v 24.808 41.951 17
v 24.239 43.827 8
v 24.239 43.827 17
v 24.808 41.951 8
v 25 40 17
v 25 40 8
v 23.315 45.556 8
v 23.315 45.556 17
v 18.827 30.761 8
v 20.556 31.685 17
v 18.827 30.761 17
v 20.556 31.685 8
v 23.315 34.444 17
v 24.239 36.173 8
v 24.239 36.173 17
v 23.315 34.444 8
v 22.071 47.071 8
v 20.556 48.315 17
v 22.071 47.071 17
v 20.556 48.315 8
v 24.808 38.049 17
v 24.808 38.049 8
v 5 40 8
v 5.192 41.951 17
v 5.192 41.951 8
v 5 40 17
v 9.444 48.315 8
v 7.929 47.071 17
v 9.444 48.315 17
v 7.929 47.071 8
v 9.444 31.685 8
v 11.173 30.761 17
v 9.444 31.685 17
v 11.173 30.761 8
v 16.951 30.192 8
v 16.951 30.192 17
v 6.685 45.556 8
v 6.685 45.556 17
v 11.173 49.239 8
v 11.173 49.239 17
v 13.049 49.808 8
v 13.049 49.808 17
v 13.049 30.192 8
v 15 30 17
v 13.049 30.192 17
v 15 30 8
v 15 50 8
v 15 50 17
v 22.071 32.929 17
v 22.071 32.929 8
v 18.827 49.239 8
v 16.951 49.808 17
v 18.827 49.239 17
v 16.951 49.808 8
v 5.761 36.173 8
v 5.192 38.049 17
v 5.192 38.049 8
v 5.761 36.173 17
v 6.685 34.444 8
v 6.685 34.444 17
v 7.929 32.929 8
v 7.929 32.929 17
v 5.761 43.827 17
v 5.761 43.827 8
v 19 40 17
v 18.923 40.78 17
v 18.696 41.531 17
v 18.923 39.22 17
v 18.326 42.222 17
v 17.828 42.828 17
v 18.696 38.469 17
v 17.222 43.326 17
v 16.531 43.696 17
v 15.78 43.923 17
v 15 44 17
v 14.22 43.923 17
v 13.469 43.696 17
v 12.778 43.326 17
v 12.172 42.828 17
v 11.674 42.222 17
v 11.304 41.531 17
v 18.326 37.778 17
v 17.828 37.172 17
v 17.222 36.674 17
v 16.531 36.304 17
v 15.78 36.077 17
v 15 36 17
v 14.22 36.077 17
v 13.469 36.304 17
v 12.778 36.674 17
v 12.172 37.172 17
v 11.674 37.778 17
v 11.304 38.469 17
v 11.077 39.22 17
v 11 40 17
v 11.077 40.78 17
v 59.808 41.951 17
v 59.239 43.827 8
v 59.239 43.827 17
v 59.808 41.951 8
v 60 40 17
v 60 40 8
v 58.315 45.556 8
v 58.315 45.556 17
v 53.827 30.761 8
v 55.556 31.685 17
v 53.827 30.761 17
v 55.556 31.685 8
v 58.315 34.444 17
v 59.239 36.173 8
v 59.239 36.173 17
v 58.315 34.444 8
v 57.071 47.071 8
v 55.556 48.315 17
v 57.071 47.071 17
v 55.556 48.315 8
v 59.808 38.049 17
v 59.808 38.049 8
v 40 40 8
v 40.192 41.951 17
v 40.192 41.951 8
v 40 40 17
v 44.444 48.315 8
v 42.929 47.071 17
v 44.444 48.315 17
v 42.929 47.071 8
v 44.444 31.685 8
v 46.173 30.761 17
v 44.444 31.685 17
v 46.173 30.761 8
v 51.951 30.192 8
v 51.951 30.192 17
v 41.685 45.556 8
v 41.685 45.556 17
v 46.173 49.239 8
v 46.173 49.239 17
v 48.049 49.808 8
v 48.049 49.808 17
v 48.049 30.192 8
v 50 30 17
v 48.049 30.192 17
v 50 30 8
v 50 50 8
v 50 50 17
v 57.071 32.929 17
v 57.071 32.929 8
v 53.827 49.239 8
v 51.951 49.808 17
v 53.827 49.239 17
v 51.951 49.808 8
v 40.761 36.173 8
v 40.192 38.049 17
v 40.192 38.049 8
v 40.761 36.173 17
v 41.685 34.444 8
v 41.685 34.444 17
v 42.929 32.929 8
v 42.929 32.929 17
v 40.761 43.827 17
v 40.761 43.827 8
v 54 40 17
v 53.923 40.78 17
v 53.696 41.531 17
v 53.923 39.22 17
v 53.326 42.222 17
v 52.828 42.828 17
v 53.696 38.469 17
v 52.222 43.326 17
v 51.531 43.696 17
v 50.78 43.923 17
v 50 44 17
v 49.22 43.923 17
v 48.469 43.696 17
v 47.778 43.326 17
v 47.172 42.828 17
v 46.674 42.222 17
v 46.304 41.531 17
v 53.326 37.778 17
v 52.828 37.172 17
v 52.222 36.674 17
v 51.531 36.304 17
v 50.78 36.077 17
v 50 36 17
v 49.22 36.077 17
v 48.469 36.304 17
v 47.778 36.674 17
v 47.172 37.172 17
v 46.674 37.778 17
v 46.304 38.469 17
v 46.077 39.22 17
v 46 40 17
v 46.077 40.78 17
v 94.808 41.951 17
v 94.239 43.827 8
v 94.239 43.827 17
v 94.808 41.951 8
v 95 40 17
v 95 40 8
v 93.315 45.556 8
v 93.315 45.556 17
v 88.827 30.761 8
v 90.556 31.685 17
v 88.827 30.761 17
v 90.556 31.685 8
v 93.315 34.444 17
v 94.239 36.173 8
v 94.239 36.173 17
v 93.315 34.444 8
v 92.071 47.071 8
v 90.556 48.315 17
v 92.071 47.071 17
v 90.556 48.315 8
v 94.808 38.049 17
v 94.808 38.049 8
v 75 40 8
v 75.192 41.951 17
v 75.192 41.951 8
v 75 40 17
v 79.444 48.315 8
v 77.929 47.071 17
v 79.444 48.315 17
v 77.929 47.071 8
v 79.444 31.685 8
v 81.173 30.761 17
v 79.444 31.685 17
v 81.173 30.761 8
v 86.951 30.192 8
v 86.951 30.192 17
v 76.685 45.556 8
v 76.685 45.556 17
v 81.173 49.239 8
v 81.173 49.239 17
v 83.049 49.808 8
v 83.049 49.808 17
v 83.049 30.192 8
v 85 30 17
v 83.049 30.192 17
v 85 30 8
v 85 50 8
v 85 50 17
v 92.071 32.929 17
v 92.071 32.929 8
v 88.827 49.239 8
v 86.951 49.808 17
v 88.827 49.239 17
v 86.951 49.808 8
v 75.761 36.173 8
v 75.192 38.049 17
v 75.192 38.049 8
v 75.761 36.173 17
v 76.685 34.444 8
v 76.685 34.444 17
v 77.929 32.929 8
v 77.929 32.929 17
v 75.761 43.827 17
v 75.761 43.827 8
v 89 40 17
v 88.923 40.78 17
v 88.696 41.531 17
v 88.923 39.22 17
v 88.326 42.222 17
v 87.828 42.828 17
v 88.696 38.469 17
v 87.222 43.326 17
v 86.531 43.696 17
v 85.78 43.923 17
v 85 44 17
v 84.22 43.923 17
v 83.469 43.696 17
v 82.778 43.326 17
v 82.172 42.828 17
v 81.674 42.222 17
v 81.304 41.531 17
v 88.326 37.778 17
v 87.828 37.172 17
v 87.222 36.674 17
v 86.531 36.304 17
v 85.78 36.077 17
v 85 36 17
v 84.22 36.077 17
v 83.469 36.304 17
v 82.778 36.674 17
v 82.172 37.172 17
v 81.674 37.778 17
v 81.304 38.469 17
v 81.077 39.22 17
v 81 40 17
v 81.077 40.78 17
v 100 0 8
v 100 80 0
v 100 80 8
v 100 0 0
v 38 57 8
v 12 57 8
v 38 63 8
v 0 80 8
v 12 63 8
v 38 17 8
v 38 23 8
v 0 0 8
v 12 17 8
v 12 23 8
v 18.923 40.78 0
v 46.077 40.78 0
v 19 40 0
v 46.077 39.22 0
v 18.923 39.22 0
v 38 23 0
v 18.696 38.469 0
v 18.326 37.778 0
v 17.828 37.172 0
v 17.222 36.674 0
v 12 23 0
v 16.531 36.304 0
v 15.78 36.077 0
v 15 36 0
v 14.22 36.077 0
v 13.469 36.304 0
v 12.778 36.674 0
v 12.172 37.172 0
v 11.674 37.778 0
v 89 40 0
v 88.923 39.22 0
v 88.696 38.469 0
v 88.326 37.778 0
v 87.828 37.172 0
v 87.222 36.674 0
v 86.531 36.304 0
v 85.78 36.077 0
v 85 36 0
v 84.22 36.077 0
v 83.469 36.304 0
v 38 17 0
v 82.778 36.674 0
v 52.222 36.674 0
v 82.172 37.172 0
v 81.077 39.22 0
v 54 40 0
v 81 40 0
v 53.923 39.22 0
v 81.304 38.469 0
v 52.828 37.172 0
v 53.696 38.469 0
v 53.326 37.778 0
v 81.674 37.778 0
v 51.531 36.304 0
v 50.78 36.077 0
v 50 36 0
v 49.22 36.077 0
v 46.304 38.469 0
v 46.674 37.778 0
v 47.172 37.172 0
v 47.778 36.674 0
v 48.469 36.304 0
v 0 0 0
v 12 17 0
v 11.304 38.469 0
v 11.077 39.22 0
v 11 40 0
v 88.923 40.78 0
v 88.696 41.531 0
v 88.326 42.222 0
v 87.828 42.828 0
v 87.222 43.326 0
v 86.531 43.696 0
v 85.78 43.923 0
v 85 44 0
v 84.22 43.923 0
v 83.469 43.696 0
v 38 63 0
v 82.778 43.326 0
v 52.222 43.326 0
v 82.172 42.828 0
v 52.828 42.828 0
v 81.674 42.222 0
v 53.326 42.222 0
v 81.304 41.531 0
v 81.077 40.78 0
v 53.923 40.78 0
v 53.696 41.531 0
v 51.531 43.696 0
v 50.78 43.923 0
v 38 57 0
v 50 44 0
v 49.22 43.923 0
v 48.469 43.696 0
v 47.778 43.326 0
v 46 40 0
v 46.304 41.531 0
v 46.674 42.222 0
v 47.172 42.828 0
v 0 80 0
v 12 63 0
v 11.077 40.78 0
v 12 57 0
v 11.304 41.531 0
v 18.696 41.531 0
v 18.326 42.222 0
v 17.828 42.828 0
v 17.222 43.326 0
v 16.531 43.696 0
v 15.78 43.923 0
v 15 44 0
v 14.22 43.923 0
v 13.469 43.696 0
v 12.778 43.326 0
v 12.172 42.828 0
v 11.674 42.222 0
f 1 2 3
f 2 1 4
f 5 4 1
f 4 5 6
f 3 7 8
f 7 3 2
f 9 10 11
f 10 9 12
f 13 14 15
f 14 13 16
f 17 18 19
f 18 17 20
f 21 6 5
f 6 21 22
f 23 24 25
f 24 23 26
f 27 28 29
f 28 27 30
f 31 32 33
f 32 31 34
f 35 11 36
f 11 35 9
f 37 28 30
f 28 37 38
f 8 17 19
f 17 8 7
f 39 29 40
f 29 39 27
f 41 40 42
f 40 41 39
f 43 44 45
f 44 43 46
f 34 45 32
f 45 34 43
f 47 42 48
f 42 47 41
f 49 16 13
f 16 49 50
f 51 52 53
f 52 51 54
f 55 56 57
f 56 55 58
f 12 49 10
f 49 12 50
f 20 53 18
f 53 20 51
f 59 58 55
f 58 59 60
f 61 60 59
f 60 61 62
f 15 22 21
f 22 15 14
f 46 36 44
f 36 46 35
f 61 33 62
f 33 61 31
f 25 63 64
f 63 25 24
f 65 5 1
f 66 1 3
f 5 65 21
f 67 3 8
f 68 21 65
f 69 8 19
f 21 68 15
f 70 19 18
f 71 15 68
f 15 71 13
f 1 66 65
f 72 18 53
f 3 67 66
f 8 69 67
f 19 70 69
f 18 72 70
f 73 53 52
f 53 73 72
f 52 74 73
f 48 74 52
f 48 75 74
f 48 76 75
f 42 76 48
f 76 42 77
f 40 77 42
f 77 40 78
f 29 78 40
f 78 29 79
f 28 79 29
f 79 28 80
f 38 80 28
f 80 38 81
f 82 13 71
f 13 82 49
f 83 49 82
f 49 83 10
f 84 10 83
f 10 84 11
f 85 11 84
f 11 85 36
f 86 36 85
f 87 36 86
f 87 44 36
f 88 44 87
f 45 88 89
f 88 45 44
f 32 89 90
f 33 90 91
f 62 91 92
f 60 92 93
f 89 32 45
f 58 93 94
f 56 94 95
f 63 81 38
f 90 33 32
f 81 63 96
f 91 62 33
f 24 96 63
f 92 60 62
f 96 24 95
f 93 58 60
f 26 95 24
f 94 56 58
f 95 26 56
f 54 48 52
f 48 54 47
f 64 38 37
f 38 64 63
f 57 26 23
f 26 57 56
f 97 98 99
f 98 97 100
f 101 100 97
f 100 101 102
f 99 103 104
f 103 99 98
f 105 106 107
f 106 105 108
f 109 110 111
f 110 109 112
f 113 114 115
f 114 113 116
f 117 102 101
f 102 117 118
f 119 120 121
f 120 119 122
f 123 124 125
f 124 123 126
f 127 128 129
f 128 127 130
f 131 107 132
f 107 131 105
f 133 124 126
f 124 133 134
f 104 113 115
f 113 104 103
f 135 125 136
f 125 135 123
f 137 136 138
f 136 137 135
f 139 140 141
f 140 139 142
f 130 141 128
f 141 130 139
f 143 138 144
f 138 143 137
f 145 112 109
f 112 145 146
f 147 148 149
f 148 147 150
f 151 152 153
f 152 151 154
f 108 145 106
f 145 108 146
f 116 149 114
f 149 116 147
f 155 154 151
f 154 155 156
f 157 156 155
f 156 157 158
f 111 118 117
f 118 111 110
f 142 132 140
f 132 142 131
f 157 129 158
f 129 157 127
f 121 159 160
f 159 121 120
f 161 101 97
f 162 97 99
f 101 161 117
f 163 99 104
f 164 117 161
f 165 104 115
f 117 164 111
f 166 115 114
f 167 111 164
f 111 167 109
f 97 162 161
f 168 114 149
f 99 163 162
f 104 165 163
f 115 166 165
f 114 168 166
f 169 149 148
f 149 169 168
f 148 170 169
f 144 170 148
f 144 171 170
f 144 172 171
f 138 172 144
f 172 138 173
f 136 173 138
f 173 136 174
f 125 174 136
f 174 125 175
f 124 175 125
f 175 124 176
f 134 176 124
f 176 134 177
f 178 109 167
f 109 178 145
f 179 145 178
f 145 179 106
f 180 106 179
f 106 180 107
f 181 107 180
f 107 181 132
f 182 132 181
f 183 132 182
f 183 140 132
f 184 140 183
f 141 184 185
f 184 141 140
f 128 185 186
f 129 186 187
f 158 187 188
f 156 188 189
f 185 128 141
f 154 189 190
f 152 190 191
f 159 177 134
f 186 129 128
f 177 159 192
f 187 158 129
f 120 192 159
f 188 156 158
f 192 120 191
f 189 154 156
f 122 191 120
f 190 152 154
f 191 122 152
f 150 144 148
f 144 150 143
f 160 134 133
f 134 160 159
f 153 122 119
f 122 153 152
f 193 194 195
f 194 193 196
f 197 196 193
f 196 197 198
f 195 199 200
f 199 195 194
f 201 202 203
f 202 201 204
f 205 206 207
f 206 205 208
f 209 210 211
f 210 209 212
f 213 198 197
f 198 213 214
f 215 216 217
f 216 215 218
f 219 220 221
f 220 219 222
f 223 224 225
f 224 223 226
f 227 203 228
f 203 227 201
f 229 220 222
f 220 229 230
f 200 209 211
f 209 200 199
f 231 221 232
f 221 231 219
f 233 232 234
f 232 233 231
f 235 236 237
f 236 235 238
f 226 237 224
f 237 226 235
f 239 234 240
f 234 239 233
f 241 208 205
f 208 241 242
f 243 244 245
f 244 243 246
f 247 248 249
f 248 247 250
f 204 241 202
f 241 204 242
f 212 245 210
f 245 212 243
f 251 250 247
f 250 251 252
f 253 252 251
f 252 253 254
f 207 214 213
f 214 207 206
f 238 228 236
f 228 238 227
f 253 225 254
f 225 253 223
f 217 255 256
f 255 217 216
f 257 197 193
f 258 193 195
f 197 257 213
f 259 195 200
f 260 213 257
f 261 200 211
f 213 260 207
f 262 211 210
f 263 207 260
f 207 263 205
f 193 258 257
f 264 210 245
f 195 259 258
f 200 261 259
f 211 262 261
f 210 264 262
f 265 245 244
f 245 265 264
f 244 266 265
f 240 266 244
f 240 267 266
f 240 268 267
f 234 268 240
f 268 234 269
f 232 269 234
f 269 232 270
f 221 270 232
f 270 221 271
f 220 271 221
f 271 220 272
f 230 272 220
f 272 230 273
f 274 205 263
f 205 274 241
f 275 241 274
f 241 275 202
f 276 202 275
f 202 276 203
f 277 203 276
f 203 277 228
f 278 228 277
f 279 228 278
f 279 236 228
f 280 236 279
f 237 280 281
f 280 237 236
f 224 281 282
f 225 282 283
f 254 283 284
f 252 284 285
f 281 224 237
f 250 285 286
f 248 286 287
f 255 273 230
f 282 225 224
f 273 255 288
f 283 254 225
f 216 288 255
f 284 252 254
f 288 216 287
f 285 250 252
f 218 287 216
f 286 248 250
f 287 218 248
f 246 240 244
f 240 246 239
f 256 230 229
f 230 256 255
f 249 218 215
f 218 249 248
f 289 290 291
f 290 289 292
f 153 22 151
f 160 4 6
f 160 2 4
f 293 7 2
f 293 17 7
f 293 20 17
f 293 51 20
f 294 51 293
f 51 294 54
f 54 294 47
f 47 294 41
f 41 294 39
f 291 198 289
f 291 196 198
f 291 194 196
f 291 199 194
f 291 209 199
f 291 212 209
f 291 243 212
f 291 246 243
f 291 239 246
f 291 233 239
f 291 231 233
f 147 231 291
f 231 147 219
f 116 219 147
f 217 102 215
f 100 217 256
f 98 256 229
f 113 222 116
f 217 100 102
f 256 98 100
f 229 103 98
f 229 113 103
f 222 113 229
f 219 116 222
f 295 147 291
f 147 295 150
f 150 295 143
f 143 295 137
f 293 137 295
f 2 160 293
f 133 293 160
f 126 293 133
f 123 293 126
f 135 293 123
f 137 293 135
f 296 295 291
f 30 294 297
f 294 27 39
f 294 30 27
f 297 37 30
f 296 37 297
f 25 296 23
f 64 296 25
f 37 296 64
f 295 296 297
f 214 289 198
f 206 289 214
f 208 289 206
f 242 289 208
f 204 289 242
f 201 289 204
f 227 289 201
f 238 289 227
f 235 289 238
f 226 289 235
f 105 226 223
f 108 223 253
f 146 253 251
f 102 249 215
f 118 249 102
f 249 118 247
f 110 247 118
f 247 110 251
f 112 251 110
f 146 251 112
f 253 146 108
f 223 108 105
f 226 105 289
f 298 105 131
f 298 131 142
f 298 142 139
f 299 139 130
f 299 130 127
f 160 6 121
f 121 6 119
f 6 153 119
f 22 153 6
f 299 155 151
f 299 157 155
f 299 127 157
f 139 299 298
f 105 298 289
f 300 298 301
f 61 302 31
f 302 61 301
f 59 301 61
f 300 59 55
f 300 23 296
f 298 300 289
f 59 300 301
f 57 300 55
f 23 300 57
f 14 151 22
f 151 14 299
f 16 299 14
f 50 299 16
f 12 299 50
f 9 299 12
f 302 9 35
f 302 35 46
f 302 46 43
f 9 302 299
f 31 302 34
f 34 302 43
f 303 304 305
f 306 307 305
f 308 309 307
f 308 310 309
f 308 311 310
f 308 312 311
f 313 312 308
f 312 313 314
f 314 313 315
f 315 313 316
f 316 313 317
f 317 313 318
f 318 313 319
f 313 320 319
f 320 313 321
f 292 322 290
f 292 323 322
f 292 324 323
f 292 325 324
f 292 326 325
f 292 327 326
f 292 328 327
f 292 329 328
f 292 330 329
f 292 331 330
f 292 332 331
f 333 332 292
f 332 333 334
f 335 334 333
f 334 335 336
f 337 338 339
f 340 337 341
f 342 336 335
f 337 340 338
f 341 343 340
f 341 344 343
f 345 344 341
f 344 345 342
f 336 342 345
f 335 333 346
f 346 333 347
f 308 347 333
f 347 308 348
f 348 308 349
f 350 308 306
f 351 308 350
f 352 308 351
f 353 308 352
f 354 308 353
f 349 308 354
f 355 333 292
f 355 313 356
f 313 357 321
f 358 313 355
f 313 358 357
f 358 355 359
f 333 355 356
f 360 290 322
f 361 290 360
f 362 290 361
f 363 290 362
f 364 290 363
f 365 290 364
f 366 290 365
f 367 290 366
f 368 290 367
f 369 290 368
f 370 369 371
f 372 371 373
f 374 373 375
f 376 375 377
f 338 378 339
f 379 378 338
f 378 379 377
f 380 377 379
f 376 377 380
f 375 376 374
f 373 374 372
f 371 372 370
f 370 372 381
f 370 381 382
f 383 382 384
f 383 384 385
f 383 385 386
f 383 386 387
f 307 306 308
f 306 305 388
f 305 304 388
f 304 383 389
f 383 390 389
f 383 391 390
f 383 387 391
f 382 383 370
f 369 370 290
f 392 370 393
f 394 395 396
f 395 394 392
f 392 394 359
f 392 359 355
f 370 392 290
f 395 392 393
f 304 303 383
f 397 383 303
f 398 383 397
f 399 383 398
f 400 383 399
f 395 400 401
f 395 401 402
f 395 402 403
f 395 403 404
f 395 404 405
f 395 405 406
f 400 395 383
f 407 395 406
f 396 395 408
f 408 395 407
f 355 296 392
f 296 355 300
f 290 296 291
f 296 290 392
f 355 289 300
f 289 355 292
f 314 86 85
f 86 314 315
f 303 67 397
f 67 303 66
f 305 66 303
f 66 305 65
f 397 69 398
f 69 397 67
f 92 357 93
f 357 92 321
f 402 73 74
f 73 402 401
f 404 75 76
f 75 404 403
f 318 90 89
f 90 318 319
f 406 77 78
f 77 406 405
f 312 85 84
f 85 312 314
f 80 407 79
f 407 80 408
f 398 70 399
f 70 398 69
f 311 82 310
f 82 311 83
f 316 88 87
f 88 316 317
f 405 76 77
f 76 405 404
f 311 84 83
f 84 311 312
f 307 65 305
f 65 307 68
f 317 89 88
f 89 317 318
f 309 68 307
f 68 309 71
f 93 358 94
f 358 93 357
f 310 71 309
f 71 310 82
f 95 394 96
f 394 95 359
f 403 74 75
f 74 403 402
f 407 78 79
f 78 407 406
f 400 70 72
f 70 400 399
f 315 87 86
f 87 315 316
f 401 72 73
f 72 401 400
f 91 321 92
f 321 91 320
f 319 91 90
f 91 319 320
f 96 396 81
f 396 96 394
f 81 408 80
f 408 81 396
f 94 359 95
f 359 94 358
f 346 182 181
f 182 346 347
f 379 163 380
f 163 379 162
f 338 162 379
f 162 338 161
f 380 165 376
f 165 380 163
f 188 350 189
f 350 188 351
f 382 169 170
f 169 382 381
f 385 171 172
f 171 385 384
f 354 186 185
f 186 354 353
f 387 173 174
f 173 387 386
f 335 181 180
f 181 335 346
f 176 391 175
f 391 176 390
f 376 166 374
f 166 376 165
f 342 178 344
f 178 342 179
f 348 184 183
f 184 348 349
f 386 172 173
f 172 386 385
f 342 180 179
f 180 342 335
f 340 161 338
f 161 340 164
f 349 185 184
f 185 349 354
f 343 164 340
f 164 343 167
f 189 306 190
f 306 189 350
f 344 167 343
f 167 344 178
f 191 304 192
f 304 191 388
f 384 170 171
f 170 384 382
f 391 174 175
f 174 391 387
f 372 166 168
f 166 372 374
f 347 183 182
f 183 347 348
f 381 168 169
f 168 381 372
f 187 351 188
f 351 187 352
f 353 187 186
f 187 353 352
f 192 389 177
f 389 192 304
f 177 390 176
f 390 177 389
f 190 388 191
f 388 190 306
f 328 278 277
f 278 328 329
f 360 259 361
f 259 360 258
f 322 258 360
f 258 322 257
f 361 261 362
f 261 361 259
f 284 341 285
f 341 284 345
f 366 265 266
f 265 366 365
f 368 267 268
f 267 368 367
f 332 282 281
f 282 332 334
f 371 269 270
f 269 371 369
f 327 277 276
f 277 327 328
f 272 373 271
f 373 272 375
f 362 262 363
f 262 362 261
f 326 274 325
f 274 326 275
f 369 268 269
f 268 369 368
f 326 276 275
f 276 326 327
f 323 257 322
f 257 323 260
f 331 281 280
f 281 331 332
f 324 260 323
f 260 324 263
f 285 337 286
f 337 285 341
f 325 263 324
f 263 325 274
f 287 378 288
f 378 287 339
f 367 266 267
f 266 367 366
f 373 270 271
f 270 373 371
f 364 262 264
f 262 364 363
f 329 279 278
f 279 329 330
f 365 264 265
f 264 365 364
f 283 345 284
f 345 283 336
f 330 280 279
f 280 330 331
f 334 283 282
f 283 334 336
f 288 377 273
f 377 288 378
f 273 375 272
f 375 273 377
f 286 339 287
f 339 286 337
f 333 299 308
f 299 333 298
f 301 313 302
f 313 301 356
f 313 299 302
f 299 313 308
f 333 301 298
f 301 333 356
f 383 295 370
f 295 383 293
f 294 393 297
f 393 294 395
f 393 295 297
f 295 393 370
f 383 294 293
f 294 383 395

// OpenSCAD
$fn = 32;

// ----------------------------------------------------------------------
// Drill jig: three_boss_slot jig
// ----------------------------------------------------------------------

// --- parameters (mm) ---
plate_l = 100;            // plate length, X
plate_w = 80;             // plate width, Y
plate_t = 8;              // plate thickness
boss_d = 20;              // guide boss diameter
boss_h = 10;              // boss height above the plate
guide_d = 8;              // guide hole diameter
boss_pitch = 35;          // boss pitch
slot_w = 6;               // clamp slot width
slot_l = 26;              // clamp slot length
slot_x = 12;              // slot start X

n_boss = 3;  // guide bosses
boss_x0 = (plate_l - (n_boss - 1) * boss_pitch) / 2;  // first boss X
boss_top = plate_t - 1 + boss_h;  // boss crown height
total_h = boss_top;  // overall height

difference() {
  union() {
  cube([plate_l, plate_w, plate_t]);
  for (i = [0 : n_boss - 1])
    translate([boss_x0 + i * boss_pitch, plate_w / 2, plate_t - 1])
      cylinder(h = boss_h, d = boss_d);
  }
  for (i = [0 : n_boss - 1])
    translate([boss_x0 + i * boss_pitch, plate_w / 2, -1])
      cylinder(h = plate_t + boss_h, d = guide_d);
  for (cy = [plate_w * 0.25, plate_w * 0.75])
    translate([slot_x, cy - slot_w / 2, -1])
      cube([slot_l, slot_w, plate_t + 2]);
}
